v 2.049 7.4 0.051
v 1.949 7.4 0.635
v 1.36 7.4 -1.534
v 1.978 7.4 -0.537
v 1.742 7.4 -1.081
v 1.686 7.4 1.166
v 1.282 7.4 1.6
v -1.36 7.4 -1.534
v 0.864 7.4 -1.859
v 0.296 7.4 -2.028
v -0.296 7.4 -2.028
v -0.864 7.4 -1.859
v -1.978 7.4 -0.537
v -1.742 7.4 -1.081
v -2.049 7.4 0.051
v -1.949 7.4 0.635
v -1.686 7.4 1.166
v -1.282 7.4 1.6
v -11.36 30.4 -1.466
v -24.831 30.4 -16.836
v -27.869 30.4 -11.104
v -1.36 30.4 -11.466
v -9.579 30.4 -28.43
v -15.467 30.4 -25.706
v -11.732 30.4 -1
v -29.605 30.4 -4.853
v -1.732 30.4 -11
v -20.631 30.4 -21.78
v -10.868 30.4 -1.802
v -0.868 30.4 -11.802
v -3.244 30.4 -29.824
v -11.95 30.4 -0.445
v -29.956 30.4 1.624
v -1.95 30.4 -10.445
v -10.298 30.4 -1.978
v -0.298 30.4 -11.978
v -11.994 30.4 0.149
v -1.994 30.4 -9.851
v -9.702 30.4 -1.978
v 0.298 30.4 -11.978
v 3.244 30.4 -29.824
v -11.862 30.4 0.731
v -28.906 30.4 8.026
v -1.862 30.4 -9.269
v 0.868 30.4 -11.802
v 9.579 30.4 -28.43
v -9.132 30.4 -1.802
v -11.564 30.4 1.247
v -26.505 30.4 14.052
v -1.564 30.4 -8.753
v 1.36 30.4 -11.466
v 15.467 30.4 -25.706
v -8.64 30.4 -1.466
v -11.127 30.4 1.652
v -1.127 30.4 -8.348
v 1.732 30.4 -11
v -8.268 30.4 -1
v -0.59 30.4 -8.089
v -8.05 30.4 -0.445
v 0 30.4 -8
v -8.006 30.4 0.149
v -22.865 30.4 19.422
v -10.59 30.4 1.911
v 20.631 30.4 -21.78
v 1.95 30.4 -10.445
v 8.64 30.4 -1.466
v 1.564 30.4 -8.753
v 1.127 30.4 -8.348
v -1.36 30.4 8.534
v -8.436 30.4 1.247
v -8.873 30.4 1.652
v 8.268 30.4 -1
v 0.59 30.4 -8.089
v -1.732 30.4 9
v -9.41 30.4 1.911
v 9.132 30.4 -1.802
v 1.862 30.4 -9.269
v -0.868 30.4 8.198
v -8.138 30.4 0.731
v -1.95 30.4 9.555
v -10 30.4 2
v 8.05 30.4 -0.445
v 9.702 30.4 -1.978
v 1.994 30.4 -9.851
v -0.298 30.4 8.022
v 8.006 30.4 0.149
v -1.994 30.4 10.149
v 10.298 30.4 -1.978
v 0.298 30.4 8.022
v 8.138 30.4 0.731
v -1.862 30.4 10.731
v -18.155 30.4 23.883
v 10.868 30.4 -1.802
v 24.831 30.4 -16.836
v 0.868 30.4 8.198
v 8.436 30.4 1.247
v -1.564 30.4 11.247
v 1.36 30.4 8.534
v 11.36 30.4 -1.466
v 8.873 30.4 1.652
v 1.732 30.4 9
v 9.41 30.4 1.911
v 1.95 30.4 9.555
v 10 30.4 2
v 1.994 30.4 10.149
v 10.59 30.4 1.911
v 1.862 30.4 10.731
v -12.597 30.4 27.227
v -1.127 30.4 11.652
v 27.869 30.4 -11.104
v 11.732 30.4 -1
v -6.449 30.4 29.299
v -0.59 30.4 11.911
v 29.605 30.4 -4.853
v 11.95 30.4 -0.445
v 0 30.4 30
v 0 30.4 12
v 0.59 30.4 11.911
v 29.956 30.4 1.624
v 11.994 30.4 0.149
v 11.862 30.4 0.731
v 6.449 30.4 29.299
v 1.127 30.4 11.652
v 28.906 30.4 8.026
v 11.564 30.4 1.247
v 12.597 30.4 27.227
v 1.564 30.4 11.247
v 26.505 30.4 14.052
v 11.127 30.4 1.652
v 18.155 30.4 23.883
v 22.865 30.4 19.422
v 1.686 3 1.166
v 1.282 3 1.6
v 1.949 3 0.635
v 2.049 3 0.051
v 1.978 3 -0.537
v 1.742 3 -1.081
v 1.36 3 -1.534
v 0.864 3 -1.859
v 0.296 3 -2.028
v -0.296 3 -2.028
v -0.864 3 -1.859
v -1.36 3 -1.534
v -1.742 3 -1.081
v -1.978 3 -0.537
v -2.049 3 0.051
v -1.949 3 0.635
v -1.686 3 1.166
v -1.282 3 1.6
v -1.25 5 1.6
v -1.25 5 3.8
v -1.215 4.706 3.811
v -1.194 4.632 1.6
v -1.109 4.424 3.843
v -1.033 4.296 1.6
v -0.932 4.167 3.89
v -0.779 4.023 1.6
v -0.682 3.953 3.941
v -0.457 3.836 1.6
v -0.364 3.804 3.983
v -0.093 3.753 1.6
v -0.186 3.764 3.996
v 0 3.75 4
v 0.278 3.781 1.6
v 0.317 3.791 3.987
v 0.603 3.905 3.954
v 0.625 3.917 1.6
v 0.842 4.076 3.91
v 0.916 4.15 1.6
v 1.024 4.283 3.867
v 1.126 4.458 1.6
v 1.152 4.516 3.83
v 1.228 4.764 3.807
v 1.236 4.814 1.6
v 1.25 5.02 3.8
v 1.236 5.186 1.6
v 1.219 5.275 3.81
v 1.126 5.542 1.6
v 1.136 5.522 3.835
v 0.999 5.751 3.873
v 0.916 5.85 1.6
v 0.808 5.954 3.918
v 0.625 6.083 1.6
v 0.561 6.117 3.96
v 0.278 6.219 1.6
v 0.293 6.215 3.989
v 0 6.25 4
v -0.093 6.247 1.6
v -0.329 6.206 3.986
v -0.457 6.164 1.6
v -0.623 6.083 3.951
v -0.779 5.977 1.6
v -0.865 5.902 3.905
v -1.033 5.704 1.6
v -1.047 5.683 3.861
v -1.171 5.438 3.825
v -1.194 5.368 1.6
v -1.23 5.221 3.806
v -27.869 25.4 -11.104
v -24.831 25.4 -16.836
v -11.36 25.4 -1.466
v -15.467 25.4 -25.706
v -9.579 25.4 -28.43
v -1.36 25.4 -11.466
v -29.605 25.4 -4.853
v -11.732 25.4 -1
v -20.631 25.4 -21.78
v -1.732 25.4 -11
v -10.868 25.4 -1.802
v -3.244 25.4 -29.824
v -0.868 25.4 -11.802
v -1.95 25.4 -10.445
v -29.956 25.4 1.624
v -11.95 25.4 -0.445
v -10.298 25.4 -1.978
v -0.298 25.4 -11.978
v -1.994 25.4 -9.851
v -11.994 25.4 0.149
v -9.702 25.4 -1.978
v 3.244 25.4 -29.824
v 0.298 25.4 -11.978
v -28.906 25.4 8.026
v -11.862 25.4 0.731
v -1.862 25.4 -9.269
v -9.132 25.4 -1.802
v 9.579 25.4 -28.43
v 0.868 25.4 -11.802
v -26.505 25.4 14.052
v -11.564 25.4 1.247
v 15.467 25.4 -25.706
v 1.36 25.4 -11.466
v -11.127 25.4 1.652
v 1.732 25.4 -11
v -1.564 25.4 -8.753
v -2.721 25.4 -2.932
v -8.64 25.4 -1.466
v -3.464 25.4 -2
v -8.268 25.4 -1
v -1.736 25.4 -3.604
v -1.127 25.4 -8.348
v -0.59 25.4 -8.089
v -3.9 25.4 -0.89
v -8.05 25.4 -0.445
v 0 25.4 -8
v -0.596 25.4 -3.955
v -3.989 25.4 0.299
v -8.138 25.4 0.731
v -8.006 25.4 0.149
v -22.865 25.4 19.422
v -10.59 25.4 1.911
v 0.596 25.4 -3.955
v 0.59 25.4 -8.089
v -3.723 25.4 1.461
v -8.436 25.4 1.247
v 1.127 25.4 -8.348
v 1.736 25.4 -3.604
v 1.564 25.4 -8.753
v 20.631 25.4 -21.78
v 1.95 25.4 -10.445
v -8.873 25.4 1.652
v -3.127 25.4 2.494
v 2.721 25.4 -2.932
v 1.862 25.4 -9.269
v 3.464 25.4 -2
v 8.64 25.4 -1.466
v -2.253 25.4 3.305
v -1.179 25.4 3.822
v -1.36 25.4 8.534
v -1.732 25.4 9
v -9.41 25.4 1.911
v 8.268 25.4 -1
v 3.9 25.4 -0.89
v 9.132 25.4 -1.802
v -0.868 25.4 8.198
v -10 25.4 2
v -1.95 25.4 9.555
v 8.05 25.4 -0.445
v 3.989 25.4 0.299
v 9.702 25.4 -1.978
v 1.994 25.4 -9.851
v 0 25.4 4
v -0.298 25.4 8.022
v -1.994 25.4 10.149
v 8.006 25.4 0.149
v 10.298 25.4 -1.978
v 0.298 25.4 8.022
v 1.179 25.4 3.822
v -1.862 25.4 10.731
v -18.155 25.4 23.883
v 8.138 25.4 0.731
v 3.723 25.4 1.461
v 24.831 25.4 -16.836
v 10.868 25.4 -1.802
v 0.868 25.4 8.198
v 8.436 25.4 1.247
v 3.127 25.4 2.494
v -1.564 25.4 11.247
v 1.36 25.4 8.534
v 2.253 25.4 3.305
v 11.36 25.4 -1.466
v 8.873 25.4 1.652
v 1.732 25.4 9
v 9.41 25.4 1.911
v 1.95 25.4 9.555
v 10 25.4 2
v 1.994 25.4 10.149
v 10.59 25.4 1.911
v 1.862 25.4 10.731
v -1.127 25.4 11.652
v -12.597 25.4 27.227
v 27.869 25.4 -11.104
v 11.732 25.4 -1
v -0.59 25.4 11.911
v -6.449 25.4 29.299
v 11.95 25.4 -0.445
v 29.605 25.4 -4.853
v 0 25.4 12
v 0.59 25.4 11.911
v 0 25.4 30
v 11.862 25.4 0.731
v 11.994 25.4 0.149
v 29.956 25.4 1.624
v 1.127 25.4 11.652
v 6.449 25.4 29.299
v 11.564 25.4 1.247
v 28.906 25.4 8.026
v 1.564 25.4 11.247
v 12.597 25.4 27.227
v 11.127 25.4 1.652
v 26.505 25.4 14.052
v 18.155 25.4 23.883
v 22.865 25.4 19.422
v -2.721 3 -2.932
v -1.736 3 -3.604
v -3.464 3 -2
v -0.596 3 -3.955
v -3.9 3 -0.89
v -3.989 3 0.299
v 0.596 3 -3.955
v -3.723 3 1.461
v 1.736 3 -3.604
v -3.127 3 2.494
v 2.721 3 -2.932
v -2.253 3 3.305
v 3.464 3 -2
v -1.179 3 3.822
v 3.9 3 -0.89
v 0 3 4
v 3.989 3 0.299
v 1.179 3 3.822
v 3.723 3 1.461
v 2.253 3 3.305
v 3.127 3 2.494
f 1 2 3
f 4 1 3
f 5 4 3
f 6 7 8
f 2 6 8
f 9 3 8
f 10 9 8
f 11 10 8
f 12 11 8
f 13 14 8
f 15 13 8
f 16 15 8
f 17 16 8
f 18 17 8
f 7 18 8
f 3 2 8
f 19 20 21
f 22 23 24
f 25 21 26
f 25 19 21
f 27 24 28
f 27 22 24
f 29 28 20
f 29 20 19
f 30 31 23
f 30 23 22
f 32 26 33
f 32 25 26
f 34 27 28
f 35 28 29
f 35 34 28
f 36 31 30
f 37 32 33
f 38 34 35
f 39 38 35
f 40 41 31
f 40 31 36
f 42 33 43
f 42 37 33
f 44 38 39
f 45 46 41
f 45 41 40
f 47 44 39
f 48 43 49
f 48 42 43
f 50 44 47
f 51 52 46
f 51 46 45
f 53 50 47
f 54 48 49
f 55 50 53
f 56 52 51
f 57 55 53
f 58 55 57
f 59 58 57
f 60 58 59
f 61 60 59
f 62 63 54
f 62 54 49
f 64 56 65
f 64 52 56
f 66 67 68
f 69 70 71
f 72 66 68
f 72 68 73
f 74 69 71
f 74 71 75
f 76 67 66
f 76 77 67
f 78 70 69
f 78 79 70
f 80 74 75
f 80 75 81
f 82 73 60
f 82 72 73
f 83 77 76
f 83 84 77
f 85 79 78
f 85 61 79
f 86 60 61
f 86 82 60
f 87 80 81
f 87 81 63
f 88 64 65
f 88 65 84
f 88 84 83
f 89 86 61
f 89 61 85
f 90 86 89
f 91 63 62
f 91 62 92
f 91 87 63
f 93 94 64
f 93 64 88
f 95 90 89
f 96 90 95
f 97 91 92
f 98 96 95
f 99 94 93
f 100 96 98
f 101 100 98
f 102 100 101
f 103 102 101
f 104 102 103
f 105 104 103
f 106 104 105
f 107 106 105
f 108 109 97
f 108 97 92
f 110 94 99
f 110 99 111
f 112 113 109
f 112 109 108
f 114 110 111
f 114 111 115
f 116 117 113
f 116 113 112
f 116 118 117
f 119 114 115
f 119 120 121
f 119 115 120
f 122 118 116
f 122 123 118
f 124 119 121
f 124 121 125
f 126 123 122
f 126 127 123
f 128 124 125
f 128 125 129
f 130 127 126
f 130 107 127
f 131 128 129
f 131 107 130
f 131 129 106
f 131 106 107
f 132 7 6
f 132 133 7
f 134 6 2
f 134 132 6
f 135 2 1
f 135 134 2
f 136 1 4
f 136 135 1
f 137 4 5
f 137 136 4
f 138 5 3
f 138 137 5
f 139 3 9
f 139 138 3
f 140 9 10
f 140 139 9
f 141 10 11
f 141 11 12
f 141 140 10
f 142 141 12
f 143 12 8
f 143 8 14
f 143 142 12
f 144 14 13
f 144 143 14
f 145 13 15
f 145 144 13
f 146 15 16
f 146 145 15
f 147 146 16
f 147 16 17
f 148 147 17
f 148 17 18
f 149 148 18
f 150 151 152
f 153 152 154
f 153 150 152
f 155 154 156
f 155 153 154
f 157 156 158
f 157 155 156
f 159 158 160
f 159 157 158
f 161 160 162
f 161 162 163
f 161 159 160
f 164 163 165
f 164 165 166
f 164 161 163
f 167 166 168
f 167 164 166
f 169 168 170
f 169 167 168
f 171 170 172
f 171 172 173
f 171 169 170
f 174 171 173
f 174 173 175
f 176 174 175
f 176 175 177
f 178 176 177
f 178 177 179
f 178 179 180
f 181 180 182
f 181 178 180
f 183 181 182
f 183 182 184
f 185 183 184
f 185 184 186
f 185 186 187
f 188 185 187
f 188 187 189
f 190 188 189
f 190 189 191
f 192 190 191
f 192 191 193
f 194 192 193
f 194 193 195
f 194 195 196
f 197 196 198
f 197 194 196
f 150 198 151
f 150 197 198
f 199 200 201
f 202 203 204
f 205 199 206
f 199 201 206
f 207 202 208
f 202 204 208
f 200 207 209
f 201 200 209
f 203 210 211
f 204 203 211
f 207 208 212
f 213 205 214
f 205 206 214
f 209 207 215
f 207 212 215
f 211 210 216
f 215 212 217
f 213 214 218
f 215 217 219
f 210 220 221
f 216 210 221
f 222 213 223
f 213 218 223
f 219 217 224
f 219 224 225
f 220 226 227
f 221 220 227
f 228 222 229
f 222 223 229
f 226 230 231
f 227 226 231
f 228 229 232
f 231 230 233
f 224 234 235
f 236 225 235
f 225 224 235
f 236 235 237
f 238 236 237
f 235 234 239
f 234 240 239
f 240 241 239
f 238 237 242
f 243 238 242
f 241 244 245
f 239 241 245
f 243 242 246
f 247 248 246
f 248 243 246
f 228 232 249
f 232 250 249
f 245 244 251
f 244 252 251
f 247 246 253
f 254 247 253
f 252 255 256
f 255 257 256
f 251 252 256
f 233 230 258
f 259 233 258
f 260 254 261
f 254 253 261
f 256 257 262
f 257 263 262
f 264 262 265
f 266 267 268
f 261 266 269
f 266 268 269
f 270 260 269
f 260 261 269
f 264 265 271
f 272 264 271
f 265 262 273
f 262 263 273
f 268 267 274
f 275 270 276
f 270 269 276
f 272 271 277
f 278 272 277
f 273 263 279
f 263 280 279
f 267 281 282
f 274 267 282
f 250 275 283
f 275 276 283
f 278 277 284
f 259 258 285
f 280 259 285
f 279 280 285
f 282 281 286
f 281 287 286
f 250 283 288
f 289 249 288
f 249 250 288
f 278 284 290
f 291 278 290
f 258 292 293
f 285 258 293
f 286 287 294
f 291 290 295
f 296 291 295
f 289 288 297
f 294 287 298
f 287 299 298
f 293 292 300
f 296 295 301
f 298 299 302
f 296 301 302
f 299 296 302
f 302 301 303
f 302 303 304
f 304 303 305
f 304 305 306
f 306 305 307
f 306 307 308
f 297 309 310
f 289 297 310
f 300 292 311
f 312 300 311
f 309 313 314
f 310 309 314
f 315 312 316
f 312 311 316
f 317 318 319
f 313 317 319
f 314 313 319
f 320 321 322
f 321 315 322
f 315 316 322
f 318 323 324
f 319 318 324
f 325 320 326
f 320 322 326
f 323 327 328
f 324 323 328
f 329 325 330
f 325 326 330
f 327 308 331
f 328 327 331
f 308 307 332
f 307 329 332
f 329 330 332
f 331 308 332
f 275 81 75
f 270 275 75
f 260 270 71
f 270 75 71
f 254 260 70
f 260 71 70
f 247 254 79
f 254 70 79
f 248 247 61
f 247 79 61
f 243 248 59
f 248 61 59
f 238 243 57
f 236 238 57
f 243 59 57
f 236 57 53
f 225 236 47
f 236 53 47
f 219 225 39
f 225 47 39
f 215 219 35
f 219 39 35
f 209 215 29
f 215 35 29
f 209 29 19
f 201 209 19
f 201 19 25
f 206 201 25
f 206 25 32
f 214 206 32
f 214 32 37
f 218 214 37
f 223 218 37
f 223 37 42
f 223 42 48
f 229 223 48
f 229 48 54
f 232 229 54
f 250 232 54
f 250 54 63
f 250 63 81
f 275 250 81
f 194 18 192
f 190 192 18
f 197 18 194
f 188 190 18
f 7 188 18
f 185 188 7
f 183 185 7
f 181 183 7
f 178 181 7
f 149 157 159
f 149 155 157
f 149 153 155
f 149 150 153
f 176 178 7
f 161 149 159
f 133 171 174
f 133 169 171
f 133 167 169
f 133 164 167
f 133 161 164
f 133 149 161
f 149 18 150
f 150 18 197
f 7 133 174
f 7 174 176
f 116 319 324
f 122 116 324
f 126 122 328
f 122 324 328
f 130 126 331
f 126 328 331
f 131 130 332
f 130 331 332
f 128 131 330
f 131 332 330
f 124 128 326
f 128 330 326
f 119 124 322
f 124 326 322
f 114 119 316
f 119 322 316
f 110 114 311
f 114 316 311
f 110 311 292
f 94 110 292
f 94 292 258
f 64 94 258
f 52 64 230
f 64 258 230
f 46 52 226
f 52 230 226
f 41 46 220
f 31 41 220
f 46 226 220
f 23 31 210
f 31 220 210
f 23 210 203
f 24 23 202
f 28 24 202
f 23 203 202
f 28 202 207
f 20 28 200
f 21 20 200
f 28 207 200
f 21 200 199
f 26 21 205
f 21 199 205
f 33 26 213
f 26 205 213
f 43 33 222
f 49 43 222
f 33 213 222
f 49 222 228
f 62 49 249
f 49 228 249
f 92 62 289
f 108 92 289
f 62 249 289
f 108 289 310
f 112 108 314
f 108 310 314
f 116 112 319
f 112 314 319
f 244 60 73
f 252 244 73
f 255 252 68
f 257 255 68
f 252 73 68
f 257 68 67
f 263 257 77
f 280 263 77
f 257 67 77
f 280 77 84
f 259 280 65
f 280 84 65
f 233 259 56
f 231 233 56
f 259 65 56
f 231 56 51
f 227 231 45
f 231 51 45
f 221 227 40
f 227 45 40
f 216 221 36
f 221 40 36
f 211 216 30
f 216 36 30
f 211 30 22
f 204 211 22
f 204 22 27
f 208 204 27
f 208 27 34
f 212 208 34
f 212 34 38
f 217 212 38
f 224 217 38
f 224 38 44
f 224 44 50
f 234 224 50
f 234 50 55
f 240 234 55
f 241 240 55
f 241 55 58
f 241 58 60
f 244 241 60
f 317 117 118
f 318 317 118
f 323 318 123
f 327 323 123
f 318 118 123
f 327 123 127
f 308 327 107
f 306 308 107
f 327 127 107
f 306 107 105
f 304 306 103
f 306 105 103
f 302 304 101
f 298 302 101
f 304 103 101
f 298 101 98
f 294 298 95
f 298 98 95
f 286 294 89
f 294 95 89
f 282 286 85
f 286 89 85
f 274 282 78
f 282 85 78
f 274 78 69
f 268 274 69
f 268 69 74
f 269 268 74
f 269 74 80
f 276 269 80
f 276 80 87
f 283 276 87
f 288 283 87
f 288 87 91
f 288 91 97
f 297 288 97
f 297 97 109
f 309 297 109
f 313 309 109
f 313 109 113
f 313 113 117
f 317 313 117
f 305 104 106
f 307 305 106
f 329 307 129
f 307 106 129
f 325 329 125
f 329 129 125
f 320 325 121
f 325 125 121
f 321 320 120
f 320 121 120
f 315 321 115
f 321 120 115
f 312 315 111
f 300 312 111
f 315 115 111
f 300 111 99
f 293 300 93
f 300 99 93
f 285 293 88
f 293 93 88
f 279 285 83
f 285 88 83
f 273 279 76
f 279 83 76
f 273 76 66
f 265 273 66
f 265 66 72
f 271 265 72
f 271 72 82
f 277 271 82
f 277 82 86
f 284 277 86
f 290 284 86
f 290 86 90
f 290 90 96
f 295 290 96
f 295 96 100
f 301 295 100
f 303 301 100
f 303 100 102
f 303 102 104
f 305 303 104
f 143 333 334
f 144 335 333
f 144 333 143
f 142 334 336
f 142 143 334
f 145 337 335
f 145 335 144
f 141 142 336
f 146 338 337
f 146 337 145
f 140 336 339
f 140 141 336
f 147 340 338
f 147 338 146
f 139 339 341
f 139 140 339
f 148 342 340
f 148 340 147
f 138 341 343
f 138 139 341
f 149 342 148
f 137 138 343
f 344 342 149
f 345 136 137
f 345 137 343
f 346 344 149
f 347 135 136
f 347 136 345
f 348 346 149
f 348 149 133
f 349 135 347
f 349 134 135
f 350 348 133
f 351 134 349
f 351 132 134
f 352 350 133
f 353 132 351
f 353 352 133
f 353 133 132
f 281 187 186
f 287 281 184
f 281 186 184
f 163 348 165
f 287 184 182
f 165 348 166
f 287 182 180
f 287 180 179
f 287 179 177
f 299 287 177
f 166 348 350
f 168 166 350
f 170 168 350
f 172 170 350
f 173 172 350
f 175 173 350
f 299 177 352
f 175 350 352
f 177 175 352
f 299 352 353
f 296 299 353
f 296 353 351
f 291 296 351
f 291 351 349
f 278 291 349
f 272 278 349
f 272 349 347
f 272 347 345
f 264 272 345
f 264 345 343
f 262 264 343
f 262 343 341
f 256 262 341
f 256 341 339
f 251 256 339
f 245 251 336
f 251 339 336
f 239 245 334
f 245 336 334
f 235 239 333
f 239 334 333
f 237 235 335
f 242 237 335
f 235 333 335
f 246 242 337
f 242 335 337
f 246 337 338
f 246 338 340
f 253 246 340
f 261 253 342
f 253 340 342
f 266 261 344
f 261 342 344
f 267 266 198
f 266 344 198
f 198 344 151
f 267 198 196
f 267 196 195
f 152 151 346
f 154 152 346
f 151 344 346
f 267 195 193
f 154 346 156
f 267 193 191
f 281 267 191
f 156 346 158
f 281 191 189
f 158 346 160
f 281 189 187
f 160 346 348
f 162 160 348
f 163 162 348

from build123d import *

# Parameters (mm, degrees)
CROQUIS1_R              = 4
CROQUIS1_R_2            = 2.05
SALIENTE_EXTRUIR1_DEPTH = 25.4
CROQUIS2_R              = 30
SALIENTE_EXTRUIR2_DEPTH = 5
CROQUIS3_R              = 2
CORTAR_EXTRUIR1_DEPTH   = 7.5
CROQUIS7_R              = 3.5
CORTAR_EXTRUIR3_DEPTH   = 3
CROQUIS8_W              = 62.698346187
CROQUIS8_H              = 3
CORTAR_EXTRUIR5_DEPTH   = 15
CROQUIS1_3_R            = 2.05
CORTAR_EXTRUIR6_DEPTH   = 7.4
SALIENTE_EXTRUIR3_DEPTH = 10
CROQUIS6_R              = 1.25
CORTAR_EXTRUIR7_DEPTH   = 10


with BuildPart() as part:
    # Croquis1 → Saliente-Extruir1 (new body)
    with BuildSketch(Plane(origin=(0, 0, 0), x_dir=(1, 0, 0), z_dir=(0, 1, 0))):
        with Locations(Location((0, 0, 0), (0, 0, 270))):
            Circle(CROQUIS1_R)
        Circle(CROQUIS1_R_2, mode=Mode.SUBTRACT)
        Circle(CROQUIS1_R_2)
    extrude(amount=SALIENTE_EXTRUIR1_DEPTH)

    # Croquis2 → Saliente-Extruir2 (add)
    with BuildSketch(Plane(origin=(0, 25.4, 0), x_dir=(1, 0, 0), z_dir=(0, 1, 0))):
        with Locations(Location((0, 0, 0), (0, 0, 270))):
            Circle(CROQUIS2_R)
    extrude(amount=SALIENTE_EXTRUIR2_DEPTH)

    # Croquis3 → Cortar-Extruir1 (cut)
    with BuildSketch(Plane(origin=(0, 30.4, 0), x_dir=(1, 0, 0), z_dir=(0, 1, 0))):
        with Locations(Location((0, 10, 0), (0, 0, 270))):
            Circle(CROQUIS3_R)
        with Locations(Location((10, 0, 0), (0, 0, 270))):
            Circle(CROQUIS3_R)
        with Locations(Location((0, -10, 0), (0, 0, 270))):
            Circle(CROQUIS3_R)
        with Locations(Location((-10, 0, 0), (0, 0, 270))):
            Circle(CROQUIS3_R)
    extrude(amount=-CORTAR_EXTRUIR1_DEPTH, mode=Mode.SUBTRACT)

    # Croquis7 → Cortar-Extruir3 (cut)
    with BuildSketch(Plane.XZ):
        with Locations(Location((0, 0, 0), (0, 0, 270))):
            Circle(CROQUIS7_R)
    extrude(amount=-CORTAR_EXTRUIR3_DEPTH, mode=Mode.SUBTRACT)

    # Croquis8 → Cortar-Extruir5 (cut, symmetric)
    with BuildSketch(Plane(origin=(0, 0, 0), x_dir=(0, 0, -1), z_dir=(1, 0, 0))):
        with Locations((4.276742622, 1.5)):
            Rectangle(CROQUIS8_W, CROQUIS8_H)
    extrude(amount=CORTAR_EXTRUIR5_DEPTH, both=True, mode=Mode.SUBTRACT)

    # Croquis1<3> → Cortar-Extruir6 (cut)
    with BuildSketch(Plane(origin=(0, 0, 0), x_dir=(1, 0, 0), z_dir=(0, 1, 0))):
        with Locations(Location((0, 0, 0), (0, 0, 90))):
            Circle(CROQUIS1_3_R)
    extrude(amount=CORTAR_EXTRUIR6_DEPTH, mode=Mode.SUBTRACT)

    # Croquis9 → Saliente-Extruir3 (add)
    with BuildSketch(Plane.XZ.offset(-3)):
        with BuildLine():
            ThreePointArc((1.281600562, 1.6), (0, 2.05), (-1.281600562, 1.6))
            Line((-1.281600562, 1.6), (1.281600562, 1.6))
        make_face()
    extrude(amount=-SALIENTE_EXTRUIR3_DEPTH)

    # Croquis6 → Cortar-Extruir7 (cut)
    with BuildSketch(Plane.XY):
        with Locations(Location((0, 5, 0), (0, 0, 180))):
            Circle(CROQUIS6_R)
    extrude(amount=CORTAR_EXTRUIR7_DEPTH, mode=Mode.SUBTRACT)


solid = part.part
